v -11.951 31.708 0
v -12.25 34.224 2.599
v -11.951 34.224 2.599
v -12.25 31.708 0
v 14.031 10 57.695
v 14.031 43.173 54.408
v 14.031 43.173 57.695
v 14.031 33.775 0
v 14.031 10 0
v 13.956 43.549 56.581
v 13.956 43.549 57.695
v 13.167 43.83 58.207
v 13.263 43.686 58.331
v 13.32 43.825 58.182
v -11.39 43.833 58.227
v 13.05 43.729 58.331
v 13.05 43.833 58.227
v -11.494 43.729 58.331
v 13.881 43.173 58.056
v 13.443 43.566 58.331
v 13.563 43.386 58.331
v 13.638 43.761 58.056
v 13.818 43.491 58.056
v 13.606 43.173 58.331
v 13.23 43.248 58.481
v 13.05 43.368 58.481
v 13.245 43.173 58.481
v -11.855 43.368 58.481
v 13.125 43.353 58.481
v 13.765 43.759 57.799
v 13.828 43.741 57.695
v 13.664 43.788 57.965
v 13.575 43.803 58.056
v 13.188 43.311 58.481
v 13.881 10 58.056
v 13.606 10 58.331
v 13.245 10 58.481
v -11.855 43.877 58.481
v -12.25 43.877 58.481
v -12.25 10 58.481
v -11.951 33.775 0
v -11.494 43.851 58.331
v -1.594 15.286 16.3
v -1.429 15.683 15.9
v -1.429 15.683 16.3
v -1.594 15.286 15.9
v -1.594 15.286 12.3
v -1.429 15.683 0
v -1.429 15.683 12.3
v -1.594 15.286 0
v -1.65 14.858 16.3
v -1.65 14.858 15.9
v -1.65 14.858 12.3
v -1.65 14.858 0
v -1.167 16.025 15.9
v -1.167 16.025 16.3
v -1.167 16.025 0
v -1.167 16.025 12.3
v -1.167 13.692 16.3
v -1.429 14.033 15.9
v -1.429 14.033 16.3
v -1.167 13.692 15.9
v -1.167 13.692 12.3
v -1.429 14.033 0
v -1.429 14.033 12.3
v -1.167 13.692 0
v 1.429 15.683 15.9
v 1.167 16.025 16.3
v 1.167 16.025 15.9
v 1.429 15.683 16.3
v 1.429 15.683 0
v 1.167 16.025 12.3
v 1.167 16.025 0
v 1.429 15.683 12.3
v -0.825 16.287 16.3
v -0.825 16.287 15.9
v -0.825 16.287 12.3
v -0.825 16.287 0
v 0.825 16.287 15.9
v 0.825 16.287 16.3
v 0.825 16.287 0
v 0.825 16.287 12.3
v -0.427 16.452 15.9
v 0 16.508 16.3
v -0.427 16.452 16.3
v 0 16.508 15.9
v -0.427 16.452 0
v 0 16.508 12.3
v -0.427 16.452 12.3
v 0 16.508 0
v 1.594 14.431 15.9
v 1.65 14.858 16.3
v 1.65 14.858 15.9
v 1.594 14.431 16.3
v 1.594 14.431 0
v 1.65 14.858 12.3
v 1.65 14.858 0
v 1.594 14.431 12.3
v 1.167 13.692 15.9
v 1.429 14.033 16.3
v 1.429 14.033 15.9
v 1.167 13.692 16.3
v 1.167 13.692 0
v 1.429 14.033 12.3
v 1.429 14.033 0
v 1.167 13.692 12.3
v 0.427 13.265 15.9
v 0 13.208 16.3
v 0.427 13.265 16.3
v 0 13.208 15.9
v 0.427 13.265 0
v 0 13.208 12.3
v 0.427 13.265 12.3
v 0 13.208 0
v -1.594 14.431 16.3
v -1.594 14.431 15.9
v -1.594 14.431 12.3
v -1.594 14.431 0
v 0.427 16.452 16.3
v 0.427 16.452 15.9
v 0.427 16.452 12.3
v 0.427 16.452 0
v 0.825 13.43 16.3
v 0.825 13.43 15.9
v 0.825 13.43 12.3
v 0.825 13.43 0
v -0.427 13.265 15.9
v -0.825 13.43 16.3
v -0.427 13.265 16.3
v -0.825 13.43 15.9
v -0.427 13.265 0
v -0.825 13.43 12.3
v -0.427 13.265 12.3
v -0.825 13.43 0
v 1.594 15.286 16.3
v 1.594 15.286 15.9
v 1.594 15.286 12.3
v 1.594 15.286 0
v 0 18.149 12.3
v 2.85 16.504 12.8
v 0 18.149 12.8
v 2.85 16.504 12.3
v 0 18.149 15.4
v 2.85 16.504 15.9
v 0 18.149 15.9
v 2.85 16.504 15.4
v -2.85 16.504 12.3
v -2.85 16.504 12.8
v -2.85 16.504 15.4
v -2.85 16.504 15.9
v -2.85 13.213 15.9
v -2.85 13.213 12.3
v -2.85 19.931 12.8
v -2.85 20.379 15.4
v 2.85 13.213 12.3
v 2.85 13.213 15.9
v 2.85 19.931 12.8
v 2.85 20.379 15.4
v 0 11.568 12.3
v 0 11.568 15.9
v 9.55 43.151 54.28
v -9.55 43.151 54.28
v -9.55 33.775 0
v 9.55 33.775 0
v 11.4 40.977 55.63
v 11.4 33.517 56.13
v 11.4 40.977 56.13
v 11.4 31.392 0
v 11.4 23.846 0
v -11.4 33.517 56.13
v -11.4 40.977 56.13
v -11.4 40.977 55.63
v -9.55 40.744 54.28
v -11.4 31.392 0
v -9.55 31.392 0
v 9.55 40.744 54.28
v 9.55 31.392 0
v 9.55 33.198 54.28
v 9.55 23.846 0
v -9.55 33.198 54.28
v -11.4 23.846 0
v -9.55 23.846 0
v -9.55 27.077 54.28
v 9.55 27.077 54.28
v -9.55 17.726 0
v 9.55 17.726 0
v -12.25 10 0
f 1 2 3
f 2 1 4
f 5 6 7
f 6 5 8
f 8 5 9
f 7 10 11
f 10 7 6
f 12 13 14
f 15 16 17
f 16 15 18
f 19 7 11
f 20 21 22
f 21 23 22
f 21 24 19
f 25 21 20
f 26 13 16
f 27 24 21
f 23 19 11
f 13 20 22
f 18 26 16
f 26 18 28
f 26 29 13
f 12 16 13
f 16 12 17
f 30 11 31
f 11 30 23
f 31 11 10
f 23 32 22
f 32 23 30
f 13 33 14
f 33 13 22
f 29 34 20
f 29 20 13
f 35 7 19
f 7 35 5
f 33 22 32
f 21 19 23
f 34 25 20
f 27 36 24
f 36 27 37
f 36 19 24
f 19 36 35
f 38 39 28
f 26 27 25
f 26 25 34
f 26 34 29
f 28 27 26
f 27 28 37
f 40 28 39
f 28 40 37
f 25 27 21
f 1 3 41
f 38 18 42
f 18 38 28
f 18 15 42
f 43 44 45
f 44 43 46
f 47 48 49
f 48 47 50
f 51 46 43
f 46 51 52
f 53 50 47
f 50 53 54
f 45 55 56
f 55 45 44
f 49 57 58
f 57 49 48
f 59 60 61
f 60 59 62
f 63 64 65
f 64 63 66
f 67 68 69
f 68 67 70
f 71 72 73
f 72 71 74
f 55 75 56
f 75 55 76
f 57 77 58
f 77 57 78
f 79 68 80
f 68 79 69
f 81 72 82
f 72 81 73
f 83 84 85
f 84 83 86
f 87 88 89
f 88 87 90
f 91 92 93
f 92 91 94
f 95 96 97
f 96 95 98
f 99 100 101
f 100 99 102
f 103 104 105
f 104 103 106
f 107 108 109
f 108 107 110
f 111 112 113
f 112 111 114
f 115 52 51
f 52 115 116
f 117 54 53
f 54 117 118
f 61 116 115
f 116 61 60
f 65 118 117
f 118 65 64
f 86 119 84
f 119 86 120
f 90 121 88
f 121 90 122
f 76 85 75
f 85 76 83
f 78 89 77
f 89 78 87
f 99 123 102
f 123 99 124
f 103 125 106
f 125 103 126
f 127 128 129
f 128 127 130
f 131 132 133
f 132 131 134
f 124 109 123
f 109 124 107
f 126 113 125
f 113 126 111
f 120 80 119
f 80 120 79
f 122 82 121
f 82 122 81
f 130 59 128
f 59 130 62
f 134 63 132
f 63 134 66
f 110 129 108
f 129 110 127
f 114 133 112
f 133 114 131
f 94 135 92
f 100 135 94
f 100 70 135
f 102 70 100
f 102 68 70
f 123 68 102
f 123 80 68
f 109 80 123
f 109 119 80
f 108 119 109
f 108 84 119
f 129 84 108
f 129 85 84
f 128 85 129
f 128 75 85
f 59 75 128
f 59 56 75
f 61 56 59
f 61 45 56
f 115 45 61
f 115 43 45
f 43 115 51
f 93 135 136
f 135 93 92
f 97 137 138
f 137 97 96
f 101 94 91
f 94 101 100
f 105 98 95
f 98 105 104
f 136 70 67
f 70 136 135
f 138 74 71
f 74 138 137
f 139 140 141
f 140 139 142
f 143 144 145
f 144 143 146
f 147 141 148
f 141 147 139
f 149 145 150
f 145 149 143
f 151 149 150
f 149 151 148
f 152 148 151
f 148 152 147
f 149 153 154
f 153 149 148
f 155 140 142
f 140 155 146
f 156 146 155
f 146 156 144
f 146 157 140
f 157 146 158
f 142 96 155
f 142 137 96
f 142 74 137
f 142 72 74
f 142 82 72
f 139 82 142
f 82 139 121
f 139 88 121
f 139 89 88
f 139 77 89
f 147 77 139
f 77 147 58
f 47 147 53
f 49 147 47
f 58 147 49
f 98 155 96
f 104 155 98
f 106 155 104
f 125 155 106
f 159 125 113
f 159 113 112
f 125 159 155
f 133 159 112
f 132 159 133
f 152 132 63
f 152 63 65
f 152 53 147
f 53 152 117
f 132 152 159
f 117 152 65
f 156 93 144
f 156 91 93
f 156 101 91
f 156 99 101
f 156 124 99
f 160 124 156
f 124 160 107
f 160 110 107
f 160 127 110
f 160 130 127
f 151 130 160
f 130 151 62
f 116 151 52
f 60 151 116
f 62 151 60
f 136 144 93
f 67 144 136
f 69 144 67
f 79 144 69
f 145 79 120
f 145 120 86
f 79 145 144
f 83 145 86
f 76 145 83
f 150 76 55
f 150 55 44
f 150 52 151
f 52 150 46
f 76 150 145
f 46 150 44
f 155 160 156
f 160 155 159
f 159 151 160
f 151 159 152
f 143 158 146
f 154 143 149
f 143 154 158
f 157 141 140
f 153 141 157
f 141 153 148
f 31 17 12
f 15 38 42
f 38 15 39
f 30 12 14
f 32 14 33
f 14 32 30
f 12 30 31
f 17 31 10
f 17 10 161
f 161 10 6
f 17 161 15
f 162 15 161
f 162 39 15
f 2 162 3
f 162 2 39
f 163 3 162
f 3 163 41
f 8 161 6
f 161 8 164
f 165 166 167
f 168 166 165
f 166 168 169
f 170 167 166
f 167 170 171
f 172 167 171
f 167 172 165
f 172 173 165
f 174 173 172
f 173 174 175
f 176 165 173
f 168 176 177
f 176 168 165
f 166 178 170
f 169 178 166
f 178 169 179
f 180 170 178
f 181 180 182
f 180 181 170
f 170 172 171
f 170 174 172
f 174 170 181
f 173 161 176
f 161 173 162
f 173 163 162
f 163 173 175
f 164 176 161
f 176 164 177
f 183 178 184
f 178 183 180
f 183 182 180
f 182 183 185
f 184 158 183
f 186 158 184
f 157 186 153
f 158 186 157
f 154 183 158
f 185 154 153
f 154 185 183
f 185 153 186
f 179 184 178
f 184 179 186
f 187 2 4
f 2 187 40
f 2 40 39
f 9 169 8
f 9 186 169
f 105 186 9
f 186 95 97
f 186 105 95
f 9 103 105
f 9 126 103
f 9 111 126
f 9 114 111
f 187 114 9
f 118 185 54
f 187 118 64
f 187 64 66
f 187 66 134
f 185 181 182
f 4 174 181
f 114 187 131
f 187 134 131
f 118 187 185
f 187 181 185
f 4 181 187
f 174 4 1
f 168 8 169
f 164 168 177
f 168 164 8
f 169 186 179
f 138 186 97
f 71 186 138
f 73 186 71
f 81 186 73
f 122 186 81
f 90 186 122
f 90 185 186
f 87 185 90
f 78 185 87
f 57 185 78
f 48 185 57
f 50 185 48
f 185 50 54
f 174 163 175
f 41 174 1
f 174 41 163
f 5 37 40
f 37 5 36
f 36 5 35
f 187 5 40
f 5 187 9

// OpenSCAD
// Right tread carriage — mirror of tread-carriage.scad (right bumper bracket hand).
//
// With a symmetric X selection cube (e.g. −15…+15) this is the same volume as the
// left hand; included for parity with bumper-bracket-right.scad exports.

BUMPER_BRACKET_INCLUDED_BY = true;
include <bumper-bracket.scad>

$fn = preview ? 32 : 64;

mirror([1, 0, 0])
    tread_carriage_export_bed_lift()
        tread_carriage();
